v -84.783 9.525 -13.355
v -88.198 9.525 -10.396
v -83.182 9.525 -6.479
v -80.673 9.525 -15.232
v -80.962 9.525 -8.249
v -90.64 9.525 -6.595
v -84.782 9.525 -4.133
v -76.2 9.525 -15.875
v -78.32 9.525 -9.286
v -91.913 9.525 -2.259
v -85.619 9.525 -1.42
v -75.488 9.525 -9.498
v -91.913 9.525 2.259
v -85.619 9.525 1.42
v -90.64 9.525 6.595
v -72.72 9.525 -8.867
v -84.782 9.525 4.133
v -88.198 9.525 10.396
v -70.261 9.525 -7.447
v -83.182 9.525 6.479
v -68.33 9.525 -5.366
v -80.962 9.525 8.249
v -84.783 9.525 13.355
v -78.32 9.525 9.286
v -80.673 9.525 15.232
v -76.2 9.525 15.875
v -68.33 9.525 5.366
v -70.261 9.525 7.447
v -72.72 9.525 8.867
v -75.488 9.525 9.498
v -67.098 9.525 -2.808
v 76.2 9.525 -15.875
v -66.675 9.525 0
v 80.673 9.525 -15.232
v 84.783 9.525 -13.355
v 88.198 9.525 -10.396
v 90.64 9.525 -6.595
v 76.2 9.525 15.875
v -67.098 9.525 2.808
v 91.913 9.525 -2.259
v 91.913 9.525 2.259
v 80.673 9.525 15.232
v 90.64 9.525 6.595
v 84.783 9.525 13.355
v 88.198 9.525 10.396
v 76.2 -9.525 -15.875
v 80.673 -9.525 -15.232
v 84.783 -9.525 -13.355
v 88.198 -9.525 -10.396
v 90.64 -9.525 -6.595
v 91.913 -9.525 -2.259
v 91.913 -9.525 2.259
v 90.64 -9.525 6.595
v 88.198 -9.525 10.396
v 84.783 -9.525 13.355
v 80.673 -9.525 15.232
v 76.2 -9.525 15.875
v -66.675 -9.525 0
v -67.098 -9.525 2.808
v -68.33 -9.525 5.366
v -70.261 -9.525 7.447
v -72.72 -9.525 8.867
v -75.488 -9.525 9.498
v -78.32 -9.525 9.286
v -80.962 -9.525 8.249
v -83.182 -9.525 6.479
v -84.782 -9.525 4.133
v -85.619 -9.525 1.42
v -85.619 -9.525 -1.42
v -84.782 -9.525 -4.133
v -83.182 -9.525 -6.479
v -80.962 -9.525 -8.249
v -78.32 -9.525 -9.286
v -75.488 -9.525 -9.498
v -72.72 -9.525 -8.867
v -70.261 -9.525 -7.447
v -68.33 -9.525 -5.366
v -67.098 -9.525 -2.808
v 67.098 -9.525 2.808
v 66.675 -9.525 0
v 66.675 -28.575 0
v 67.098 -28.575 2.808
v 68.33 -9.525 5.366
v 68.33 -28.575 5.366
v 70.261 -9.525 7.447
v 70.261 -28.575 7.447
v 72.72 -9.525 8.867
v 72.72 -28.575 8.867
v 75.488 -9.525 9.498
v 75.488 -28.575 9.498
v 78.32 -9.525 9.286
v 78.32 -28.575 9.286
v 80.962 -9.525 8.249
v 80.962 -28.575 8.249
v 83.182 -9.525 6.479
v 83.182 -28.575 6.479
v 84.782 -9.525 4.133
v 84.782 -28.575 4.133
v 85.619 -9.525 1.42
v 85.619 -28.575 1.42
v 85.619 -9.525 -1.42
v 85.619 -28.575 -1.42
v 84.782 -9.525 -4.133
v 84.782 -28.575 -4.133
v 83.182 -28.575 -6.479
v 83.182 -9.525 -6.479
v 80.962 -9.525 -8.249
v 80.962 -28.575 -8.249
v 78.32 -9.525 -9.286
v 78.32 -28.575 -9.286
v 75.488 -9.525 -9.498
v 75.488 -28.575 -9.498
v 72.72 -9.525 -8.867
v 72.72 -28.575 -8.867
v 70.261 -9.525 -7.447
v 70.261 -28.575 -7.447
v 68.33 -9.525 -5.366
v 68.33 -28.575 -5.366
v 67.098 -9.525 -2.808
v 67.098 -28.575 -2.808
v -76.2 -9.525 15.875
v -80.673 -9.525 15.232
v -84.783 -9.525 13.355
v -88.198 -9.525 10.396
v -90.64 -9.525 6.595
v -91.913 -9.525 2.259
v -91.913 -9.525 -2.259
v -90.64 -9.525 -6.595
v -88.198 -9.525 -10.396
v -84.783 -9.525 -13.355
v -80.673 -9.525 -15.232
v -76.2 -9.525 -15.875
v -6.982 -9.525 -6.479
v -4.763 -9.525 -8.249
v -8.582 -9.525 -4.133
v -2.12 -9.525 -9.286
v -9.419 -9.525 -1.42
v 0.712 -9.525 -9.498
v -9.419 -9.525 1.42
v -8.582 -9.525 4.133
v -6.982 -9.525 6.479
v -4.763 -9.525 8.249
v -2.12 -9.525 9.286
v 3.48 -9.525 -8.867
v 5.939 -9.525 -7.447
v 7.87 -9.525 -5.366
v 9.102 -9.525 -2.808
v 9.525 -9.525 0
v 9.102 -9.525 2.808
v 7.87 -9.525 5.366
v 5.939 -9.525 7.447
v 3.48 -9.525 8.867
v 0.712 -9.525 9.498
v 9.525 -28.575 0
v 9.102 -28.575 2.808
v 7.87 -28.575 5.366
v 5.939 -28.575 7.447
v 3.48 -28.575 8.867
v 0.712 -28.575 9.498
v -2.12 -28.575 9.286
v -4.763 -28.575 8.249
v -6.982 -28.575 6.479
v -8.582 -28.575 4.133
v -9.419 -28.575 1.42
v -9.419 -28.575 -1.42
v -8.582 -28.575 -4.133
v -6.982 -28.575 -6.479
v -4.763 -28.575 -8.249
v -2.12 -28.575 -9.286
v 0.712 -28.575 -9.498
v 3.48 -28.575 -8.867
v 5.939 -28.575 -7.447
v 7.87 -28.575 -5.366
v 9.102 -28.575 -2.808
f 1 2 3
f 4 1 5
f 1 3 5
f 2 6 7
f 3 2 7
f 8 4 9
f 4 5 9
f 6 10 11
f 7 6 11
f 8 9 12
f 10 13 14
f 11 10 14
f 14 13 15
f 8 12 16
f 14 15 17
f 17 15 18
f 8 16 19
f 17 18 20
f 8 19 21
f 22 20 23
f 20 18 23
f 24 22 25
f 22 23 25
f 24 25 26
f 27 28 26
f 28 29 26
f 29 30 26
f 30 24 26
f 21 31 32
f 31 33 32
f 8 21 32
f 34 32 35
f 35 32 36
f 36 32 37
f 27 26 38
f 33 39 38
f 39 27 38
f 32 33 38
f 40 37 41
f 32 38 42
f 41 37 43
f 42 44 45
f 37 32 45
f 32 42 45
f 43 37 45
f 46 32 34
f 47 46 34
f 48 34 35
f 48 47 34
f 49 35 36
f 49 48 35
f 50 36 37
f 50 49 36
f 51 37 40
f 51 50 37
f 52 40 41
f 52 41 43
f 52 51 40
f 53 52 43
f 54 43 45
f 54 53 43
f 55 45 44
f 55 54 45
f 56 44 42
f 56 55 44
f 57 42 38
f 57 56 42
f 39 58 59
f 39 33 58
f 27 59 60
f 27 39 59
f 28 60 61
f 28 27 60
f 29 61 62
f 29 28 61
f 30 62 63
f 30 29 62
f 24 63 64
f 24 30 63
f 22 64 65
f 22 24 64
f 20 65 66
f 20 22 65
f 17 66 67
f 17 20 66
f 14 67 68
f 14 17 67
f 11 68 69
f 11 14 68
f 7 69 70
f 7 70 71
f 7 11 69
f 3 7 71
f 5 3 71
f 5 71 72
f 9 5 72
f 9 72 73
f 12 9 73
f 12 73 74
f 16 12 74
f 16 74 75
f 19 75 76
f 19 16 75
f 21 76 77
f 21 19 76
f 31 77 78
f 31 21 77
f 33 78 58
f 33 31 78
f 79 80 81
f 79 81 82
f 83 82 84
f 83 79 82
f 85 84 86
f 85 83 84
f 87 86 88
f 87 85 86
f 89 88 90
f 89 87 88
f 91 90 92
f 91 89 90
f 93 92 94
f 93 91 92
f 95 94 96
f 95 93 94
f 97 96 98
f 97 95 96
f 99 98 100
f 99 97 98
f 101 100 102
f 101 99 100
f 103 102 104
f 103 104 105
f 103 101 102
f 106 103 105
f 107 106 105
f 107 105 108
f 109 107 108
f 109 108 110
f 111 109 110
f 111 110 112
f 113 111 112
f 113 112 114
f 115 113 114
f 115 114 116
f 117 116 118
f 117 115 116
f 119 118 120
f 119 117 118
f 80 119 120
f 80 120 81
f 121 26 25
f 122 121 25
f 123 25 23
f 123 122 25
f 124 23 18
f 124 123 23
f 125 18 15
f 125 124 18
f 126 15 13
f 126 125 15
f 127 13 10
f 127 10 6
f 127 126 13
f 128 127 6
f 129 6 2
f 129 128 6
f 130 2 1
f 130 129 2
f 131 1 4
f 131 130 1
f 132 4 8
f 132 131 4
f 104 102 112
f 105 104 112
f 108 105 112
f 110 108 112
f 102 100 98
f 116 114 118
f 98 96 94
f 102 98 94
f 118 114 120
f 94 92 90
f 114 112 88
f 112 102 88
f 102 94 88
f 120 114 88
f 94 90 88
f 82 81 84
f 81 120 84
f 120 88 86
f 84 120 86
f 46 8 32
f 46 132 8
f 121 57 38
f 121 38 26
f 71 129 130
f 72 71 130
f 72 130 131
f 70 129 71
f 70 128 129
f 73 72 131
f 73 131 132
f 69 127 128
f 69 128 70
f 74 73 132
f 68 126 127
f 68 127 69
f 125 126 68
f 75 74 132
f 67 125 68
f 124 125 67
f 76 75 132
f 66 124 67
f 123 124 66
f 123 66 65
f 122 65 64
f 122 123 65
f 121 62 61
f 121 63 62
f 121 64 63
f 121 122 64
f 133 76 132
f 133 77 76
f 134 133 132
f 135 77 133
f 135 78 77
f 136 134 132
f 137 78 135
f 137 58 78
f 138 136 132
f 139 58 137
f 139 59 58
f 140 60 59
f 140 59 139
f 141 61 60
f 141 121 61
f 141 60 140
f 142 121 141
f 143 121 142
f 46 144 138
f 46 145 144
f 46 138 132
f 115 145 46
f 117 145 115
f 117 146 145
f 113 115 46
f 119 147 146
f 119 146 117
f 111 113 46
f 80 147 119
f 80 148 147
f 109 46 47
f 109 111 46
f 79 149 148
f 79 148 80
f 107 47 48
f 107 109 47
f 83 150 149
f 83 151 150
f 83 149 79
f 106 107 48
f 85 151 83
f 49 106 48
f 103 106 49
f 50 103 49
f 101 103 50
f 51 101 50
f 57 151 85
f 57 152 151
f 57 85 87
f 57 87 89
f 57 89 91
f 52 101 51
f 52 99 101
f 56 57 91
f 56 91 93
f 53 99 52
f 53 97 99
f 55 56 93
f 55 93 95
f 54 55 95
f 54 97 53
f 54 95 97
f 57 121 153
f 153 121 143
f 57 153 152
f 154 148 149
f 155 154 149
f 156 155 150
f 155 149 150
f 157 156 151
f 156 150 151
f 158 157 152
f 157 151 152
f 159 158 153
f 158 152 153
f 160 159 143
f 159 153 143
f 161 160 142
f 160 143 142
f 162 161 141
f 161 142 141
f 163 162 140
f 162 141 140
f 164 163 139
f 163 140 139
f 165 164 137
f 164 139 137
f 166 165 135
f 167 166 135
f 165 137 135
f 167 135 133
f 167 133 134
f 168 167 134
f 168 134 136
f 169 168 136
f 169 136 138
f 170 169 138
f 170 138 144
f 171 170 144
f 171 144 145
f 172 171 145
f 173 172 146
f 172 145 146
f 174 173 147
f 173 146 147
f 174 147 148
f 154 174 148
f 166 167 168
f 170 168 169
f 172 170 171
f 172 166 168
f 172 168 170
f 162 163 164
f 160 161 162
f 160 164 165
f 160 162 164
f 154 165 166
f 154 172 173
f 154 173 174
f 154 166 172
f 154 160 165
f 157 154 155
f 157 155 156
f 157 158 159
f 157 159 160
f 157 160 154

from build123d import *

# Parameters (mm, degrees)
F0_R     = 9.525
F1_DEPTH = 9.525
F2_R     = 9.525
F3_DEPTH = 19.05


# Not quite as in the source:
# - a feature of the source that left no trace in its solid (it failed there, or was rolled back) is left out
# - a pattern or mirror of a feature is missing from the dataset's text; its kind, count and spacing are read off the source's solid


with BuildPart() as f1:
    # F0 (on Front) → F1 (new body, symmetric)
    with BuildSketch(Plane.XZ):
        with BuildLine():
            ThreePointArc((76.2, -15.875), (92.075, 0), (76.2, 15.875))
            Line((76.2, 15.875), (-76.2, 15.875))
            ThreePointArc((-76.2, 15.875), (-92.075, 0), (-76.2, -15.875))
            Line((-76.2, -15.875), (76.2, -15.875))
        make_face()
        with Locations((-76.2, 0)):
            Circle(F0_R, mode=Mode.SUBTRACT)
        with Locations((76.2, 0)):
            Circle(F0_R, mode=Mode.SUBTRACT)
        with Locations((76.2, 0)):
            Circle(F0_R)
    extrude(amount=F1_DEPTH, both=True)

    # F2 (on face) → F3 (join)
    with BuildSketch(Plane.XZ.offset(9.525)):
        Circle(F2_R)
    f3 = extrude(amount=F3_DEPTH)

    # F3_copies: F3 across plane
    add(f3.mirror(Plane(origin=(38.1, 0, 0), x_dir=(0, 0, 1), z_dir=(1, 0, 0))))


solid = f1.part
